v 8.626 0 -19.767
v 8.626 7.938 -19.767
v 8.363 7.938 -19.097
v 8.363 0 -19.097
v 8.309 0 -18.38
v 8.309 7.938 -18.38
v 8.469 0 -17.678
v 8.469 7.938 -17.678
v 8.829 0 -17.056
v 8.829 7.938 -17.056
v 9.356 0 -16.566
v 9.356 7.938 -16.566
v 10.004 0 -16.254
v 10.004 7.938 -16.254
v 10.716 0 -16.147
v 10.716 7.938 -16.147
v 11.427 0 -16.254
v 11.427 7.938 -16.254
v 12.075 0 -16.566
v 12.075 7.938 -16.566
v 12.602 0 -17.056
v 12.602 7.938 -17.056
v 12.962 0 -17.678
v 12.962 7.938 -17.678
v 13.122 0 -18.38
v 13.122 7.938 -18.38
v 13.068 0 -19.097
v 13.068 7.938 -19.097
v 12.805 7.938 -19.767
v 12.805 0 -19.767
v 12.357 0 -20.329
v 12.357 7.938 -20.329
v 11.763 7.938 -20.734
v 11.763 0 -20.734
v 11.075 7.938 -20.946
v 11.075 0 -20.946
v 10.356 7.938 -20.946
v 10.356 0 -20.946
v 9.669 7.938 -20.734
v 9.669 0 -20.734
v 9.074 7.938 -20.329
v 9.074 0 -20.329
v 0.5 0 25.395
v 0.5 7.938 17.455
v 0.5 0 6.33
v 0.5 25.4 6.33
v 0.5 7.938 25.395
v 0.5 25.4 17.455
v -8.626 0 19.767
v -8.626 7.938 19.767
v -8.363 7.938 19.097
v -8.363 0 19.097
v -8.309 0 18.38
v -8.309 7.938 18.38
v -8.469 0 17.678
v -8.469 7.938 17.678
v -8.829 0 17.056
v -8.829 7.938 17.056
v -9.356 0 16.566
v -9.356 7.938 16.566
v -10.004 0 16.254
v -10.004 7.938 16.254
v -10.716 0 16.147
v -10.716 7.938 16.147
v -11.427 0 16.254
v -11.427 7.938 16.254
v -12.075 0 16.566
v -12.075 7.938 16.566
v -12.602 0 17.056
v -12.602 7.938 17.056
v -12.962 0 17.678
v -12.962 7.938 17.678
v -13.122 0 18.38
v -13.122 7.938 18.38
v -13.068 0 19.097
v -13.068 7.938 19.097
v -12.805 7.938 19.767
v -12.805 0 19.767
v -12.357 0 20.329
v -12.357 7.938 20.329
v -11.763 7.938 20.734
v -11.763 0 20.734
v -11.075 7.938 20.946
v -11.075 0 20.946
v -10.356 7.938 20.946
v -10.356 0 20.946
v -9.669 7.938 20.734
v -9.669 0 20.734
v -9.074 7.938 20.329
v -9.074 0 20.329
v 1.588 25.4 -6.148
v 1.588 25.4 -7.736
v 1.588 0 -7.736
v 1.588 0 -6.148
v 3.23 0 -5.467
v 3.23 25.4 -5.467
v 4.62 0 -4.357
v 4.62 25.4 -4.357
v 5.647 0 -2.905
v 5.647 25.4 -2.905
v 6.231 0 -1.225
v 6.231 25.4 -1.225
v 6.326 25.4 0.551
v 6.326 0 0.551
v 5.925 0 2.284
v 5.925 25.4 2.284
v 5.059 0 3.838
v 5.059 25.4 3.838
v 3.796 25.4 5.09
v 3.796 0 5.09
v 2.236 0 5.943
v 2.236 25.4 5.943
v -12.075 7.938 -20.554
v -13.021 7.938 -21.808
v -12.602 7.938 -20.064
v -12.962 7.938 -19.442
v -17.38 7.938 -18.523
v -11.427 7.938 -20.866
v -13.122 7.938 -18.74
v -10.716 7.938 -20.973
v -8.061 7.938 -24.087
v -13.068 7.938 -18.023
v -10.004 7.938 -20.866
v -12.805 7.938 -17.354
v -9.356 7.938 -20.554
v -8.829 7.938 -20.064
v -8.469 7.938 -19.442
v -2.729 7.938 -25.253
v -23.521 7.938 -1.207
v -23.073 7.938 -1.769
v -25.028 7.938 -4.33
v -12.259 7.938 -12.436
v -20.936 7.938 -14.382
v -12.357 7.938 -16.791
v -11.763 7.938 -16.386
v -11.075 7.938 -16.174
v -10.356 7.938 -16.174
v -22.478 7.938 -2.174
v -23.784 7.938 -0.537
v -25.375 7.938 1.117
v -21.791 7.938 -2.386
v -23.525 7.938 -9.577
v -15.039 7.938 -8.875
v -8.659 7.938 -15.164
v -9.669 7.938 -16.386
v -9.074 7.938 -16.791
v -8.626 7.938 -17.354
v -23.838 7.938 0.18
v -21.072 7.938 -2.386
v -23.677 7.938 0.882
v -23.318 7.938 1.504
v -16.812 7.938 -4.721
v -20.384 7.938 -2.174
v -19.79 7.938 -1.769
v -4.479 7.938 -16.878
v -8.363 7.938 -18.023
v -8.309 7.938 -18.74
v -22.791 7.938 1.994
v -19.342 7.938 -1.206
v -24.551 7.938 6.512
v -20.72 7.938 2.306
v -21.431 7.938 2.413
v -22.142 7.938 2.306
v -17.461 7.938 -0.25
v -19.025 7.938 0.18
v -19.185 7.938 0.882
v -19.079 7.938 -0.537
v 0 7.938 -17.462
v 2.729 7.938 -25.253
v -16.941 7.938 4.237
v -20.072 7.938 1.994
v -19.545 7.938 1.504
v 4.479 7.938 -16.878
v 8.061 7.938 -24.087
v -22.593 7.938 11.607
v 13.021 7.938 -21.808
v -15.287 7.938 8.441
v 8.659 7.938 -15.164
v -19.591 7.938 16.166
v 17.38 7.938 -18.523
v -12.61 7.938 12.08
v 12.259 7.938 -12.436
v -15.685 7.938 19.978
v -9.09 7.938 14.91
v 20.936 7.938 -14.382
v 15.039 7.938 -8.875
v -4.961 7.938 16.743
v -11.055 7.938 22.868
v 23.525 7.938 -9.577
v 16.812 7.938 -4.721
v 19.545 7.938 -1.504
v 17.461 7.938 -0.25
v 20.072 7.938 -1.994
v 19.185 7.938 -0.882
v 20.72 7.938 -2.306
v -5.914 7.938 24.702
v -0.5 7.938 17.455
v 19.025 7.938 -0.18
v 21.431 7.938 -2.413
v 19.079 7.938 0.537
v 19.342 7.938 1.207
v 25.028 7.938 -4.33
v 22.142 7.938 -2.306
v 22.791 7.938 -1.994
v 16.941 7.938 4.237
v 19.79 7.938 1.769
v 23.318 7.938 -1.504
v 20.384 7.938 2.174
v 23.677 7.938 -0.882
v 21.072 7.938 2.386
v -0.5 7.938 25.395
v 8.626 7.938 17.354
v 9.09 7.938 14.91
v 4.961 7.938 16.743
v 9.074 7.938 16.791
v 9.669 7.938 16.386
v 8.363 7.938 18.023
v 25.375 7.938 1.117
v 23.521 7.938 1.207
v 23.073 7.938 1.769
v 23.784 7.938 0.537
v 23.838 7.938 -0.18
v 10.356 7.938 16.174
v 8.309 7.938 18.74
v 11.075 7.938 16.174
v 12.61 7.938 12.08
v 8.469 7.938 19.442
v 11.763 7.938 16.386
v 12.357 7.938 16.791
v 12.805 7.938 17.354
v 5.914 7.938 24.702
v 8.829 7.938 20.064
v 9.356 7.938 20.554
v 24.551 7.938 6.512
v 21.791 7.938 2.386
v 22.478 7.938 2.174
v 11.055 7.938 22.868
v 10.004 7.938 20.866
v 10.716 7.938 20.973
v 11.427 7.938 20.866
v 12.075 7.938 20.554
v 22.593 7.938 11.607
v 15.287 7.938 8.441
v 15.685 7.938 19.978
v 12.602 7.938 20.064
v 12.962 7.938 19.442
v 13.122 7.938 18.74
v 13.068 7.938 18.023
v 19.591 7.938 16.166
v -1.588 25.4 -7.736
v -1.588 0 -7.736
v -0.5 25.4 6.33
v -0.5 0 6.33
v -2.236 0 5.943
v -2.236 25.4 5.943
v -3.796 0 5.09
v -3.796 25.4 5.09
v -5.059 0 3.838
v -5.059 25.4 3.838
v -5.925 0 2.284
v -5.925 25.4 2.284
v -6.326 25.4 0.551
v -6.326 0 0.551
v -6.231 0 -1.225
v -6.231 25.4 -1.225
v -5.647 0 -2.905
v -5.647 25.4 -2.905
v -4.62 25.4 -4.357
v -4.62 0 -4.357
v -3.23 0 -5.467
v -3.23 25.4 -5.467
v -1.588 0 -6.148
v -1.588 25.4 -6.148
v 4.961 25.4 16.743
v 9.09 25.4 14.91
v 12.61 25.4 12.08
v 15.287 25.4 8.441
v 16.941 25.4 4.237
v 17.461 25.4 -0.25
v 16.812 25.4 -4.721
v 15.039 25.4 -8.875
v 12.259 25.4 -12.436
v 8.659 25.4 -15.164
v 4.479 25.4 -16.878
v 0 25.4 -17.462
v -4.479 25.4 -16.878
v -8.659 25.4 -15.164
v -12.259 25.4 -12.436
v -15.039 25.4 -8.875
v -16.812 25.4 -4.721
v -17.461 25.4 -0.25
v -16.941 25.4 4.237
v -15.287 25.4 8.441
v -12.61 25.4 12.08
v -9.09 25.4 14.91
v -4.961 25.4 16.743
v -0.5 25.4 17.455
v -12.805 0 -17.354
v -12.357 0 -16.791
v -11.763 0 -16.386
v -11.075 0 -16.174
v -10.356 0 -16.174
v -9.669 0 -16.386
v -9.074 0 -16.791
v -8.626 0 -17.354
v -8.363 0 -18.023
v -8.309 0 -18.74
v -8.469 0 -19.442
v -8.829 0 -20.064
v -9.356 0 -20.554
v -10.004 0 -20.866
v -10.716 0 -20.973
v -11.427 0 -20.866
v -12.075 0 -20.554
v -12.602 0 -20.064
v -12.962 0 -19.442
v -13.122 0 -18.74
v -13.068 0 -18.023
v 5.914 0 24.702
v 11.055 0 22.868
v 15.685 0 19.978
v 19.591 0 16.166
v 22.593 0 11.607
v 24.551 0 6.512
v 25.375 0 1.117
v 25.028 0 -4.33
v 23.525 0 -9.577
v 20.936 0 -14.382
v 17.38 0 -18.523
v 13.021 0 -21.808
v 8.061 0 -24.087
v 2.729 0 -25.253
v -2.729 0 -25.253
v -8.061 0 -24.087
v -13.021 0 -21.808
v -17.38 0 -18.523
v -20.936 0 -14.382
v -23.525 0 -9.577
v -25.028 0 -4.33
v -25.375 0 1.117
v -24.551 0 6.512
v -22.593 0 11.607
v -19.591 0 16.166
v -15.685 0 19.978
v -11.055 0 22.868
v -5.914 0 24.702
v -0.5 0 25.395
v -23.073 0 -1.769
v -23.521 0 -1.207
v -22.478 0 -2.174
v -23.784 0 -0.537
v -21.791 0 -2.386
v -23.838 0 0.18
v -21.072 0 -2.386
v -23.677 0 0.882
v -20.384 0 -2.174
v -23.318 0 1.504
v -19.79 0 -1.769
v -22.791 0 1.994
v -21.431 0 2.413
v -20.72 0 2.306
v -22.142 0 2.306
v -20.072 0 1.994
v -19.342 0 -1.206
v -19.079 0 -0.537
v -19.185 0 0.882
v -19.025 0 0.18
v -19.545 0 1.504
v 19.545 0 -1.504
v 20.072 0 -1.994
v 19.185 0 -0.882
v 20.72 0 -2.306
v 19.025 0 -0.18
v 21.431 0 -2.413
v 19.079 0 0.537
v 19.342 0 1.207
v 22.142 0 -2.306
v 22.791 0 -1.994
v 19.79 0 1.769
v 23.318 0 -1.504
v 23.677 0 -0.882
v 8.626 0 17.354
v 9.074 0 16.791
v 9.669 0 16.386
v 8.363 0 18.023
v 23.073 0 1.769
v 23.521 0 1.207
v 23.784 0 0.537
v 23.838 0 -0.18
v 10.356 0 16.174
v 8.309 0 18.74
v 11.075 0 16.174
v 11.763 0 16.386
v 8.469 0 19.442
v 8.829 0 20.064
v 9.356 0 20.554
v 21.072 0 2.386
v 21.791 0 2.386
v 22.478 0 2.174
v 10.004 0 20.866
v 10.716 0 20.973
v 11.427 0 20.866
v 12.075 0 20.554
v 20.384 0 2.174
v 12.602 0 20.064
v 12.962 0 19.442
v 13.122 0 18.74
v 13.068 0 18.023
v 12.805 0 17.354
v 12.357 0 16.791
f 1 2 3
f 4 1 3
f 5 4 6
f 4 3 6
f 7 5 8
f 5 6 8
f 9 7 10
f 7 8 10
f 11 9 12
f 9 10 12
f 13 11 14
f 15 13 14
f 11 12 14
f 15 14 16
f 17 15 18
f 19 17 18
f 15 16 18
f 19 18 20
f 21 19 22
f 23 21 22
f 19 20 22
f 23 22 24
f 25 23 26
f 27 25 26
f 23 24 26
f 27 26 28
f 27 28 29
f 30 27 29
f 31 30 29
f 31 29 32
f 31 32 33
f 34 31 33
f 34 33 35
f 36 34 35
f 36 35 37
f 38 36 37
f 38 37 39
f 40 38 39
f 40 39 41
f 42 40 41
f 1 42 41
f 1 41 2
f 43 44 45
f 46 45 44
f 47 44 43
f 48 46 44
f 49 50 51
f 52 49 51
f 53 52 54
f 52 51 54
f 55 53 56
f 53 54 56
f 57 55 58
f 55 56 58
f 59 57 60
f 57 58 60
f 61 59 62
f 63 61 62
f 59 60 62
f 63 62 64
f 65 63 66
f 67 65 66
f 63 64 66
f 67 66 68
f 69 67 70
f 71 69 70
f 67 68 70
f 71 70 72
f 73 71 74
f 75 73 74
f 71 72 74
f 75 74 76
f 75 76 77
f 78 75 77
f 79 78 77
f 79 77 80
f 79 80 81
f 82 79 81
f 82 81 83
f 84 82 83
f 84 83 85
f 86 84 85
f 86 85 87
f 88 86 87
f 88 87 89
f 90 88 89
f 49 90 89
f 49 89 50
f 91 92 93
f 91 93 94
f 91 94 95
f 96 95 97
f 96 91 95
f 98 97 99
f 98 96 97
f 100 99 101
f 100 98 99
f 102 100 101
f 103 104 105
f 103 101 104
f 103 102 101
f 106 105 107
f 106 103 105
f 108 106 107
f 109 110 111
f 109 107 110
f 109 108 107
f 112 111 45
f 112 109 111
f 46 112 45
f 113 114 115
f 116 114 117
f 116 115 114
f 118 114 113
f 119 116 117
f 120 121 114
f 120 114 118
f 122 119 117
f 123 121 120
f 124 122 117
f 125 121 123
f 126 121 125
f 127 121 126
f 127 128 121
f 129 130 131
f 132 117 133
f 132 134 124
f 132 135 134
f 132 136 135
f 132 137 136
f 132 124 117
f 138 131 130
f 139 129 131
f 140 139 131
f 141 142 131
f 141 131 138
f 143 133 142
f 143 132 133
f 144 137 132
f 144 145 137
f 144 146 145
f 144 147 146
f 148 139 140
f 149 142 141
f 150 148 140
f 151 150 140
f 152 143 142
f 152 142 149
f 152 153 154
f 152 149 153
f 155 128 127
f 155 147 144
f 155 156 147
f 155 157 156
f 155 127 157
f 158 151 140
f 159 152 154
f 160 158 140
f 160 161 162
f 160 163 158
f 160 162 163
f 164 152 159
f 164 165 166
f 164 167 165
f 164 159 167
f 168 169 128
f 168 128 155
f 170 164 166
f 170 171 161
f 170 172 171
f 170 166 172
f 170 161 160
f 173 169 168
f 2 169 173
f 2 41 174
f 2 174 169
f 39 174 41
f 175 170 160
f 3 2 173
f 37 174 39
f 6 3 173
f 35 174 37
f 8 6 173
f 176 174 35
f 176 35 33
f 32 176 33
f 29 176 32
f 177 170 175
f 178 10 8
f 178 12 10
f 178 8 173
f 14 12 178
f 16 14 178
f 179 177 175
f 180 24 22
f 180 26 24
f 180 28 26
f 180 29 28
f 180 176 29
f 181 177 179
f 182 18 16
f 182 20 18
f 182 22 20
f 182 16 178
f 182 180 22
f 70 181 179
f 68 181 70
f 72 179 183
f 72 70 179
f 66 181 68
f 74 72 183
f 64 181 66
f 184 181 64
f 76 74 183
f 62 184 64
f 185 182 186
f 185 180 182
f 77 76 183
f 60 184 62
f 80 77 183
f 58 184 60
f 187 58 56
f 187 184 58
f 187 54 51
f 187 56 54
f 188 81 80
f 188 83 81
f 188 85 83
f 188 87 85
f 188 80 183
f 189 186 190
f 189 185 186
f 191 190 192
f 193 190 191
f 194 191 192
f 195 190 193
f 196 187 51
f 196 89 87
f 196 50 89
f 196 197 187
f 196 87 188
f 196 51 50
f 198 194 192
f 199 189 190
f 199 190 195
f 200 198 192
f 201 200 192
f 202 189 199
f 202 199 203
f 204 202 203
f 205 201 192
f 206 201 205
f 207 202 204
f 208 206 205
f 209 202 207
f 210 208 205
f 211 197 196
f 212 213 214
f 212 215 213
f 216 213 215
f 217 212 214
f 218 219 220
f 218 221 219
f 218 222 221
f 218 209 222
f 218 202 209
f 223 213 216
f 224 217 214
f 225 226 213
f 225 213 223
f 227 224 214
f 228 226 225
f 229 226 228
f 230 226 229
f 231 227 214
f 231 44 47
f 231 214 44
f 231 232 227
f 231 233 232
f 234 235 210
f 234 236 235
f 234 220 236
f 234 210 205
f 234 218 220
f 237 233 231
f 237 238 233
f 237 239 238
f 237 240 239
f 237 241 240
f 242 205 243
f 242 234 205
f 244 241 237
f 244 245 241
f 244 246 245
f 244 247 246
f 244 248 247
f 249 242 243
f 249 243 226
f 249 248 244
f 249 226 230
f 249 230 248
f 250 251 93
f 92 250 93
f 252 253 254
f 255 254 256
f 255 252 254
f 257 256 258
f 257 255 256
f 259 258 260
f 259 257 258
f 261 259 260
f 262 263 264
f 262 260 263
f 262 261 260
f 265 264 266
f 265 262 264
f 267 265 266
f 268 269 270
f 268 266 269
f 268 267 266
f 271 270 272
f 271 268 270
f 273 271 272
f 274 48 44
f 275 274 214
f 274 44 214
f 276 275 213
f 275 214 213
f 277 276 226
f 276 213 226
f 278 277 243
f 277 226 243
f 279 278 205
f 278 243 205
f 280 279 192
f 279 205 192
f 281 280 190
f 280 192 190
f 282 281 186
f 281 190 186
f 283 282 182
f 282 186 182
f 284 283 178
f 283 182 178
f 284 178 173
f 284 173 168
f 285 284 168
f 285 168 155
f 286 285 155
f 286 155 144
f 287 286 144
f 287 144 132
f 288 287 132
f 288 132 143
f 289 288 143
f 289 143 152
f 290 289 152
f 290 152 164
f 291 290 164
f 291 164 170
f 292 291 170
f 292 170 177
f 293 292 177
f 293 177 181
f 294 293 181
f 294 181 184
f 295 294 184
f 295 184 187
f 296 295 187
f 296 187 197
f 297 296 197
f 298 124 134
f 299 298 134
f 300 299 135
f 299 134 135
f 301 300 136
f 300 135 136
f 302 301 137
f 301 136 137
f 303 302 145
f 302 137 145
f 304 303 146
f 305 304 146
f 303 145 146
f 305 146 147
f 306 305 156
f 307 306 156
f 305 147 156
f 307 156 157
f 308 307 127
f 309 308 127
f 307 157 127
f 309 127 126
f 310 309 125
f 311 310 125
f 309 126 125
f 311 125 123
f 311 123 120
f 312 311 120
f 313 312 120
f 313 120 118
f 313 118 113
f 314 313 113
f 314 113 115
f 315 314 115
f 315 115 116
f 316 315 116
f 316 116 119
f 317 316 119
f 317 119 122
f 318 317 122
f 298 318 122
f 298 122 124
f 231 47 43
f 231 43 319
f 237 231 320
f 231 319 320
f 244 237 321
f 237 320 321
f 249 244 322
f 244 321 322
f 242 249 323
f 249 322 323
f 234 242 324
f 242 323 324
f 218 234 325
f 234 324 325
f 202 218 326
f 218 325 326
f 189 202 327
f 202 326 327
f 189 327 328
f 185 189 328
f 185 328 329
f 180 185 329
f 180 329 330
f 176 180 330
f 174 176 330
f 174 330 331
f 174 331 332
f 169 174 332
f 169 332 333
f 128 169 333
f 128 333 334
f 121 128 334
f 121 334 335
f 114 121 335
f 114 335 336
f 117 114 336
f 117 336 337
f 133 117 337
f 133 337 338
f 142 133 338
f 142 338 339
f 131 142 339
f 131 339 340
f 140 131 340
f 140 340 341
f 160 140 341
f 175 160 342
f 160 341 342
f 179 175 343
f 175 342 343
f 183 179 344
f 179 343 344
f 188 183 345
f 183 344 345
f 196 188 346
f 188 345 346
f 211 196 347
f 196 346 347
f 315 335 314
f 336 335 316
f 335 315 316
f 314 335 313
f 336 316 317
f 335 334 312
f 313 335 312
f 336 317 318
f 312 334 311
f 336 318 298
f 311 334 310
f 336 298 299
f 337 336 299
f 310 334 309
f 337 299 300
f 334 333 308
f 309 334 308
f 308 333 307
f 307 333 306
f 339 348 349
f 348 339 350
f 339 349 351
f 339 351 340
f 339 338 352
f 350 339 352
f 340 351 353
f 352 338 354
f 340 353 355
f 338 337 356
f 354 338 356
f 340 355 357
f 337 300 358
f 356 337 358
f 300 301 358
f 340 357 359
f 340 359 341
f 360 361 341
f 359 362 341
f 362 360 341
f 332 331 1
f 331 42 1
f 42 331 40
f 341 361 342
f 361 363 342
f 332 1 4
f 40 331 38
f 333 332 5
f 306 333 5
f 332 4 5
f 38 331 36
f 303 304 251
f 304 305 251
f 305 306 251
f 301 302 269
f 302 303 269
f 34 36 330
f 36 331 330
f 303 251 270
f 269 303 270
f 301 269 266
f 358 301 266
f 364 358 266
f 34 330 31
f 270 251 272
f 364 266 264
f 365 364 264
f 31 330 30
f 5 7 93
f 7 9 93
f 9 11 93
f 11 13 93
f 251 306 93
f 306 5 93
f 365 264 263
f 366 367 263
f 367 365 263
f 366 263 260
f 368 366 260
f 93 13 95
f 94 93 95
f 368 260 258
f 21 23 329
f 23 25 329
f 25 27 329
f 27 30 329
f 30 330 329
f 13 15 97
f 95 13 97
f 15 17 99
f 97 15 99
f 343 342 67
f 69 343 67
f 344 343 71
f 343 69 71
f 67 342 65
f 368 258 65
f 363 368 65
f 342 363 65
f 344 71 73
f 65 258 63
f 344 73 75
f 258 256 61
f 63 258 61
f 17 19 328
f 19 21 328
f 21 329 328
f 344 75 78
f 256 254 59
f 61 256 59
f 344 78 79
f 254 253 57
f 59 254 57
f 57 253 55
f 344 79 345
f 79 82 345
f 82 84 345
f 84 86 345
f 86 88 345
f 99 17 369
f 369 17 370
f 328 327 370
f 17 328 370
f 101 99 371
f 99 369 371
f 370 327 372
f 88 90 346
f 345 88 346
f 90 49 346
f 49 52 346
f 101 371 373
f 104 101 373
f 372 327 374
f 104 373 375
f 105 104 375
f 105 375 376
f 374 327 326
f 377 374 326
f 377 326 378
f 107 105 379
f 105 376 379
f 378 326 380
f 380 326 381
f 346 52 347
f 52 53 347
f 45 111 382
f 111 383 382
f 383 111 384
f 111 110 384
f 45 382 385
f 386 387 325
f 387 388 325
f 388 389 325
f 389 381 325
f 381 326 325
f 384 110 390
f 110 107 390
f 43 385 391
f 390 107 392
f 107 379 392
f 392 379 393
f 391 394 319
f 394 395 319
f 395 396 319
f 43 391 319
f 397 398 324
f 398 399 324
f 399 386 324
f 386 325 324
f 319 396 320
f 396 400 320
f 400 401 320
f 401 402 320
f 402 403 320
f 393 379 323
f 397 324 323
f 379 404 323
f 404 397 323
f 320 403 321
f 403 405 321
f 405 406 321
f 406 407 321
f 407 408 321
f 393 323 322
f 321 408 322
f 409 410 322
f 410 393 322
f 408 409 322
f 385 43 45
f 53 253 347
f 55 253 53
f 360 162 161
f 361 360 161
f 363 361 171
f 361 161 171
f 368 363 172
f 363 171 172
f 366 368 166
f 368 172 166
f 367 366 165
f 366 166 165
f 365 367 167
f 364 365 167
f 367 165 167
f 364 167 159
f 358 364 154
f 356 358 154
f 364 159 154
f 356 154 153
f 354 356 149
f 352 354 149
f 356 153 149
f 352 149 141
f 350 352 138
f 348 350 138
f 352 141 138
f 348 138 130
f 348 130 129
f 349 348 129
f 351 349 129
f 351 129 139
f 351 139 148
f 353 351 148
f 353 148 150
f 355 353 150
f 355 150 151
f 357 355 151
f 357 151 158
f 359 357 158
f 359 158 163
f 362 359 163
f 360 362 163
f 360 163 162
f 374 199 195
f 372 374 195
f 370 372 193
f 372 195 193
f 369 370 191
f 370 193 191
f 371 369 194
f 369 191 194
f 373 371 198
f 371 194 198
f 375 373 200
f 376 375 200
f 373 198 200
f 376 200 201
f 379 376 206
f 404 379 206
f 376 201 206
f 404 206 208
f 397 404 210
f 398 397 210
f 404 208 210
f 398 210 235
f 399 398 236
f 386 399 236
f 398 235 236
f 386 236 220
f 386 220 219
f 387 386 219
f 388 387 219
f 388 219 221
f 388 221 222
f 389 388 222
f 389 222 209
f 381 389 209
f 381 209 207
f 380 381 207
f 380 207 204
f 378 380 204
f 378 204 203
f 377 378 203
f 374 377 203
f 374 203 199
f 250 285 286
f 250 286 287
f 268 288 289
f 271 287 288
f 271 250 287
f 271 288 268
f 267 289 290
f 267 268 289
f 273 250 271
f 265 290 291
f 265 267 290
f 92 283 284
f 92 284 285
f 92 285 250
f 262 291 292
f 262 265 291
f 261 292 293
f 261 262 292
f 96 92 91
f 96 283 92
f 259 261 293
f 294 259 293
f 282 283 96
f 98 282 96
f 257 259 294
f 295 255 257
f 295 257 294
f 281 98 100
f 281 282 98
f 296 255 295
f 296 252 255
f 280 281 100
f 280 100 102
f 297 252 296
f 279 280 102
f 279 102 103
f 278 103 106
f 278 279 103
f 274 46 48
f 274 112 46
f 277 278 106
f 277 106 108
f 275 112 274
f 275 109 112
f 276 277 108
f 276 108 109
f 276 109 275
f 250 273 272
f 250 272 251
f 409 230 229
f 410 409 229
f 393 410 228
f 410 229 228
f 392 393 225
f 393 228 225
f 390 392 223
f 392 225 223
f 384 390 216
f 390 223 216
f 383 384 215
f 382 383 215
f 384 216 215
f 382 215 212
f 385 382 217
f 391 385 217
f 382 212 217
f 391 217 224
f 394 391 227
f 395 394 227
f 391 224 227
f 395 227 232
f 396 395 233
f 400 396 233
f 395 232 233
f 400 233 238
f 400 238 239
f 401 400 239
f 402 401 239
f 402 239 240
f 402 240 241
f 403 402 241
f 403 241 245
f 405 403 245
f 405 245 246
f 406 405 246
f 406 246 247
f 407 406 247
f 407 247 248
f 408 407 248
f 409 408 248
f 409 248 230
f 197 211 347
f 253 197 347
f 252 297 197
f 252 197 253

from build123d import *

# Parameters (mm, degrees)
SKETCH1_R           = 25.4
BOSS_EXTRUDE1_DEPTH = 7.9375
SKETCH2_R           = 17.4625
BOSS_EXTRUDE2_DEPTH = 17.4625
CUT_EXTRUDE1_DEPTH  = 44.994090512
SKETCH4_R           = 2.413
CUT_EXTRUDE2_DEPTH  = 40.940692361
CIRPATTERN1_COUNT   = 6


with BuildPart() as part:
    # Sketch1 → Boss-Extrude1 (new body)
    with BuildSketch(Plane(origin=(0, 0, 0), x_dir=(1, 0, 0), z_dir=(0, 1, 0))):
        with Locations(Location((0, 0, 0), (0, 0, 270))):
            Circle(SKETCH1_R)
    extrude(amount=BOSS_EXTRUDE1_DEPTH)

    # Sketch2 → Boss-Extrude2 (add)
    with BuildSketch(Plane(origin=(0, 7.9375, 0), x_dir=(1, 0, 0), z_dir=(0, 1, 0))):
        with Locations(Location((0, 0, 0), (0, 0, 270))):
            Circle(SKETCH2_R)
    extrude(amount=BOSS_EXTRUDE2_DEPTH)

    # Sketch3 → Cut-Extrude1 (cut, through all)
    with BuildSketch(Plane(origin=(0, 25.4, 0), x_dir=(1, 0, 0), z_dir=(0, 1, 0))):
        with BuildLine():
            Line((-1.5875, 7.735861062), (1.5875, 7.735861062))
            Line((1.5875, 7.735861062), (1.5875, 6.148361062))
            ThreePointArc((1.5875, 6.148361062), (6.326022598, -0.551305799), (0.5, -6.330284354))
            Line((0.5, -6.330284354), (0.5, -25.4))
            Line((0.5, -25.4), (-0.5, -25.4))
            Line((-0.5, -25.4), (-0.5, -6.330284354))
            ThreePointArc((-0.5, -6.330284354), (-6.326022598, -0.551305799), (-1.5875, 6.148361062))
            Line((-1.5875, 6.148361062), (-1.5875, 7.735861062))
        make_face()
    extrude(amount=-CUT_EXTRUDE1_DEPTH, mode=Mode.SUBTRACT)

    # Sketch4 → Cut-Extrude2 (cut, through all)
    with BuildSketch(Plane(origin=(0, 7.9375, 0), x_dir=(1, 0, 0), z_dir=(0, 1, 0))):
        with Locations(Location((-21.43125, 0, 0), (0, 0, 270))):
            Circle(SKETCH4_R)
    cut_extrude2 = extrude(amount=-CUT_EXTRUDE2_DEPTH, mode=Mode.SUBTRACT)

    # CirPattern1: Cut-Extrude2 ×6 about axis
    cirpattern1_axis = Axis((0, 0, 0), (0, 1, 0))
    for i in range(1, CIRPATTERN1_COUNT):
        add(cut_extrude2.rotate(cirpattern1_axis, i * 360 / CIRPATTERN1_COUNT), mode=Mode.SUBTRACT)


solid = part.part
